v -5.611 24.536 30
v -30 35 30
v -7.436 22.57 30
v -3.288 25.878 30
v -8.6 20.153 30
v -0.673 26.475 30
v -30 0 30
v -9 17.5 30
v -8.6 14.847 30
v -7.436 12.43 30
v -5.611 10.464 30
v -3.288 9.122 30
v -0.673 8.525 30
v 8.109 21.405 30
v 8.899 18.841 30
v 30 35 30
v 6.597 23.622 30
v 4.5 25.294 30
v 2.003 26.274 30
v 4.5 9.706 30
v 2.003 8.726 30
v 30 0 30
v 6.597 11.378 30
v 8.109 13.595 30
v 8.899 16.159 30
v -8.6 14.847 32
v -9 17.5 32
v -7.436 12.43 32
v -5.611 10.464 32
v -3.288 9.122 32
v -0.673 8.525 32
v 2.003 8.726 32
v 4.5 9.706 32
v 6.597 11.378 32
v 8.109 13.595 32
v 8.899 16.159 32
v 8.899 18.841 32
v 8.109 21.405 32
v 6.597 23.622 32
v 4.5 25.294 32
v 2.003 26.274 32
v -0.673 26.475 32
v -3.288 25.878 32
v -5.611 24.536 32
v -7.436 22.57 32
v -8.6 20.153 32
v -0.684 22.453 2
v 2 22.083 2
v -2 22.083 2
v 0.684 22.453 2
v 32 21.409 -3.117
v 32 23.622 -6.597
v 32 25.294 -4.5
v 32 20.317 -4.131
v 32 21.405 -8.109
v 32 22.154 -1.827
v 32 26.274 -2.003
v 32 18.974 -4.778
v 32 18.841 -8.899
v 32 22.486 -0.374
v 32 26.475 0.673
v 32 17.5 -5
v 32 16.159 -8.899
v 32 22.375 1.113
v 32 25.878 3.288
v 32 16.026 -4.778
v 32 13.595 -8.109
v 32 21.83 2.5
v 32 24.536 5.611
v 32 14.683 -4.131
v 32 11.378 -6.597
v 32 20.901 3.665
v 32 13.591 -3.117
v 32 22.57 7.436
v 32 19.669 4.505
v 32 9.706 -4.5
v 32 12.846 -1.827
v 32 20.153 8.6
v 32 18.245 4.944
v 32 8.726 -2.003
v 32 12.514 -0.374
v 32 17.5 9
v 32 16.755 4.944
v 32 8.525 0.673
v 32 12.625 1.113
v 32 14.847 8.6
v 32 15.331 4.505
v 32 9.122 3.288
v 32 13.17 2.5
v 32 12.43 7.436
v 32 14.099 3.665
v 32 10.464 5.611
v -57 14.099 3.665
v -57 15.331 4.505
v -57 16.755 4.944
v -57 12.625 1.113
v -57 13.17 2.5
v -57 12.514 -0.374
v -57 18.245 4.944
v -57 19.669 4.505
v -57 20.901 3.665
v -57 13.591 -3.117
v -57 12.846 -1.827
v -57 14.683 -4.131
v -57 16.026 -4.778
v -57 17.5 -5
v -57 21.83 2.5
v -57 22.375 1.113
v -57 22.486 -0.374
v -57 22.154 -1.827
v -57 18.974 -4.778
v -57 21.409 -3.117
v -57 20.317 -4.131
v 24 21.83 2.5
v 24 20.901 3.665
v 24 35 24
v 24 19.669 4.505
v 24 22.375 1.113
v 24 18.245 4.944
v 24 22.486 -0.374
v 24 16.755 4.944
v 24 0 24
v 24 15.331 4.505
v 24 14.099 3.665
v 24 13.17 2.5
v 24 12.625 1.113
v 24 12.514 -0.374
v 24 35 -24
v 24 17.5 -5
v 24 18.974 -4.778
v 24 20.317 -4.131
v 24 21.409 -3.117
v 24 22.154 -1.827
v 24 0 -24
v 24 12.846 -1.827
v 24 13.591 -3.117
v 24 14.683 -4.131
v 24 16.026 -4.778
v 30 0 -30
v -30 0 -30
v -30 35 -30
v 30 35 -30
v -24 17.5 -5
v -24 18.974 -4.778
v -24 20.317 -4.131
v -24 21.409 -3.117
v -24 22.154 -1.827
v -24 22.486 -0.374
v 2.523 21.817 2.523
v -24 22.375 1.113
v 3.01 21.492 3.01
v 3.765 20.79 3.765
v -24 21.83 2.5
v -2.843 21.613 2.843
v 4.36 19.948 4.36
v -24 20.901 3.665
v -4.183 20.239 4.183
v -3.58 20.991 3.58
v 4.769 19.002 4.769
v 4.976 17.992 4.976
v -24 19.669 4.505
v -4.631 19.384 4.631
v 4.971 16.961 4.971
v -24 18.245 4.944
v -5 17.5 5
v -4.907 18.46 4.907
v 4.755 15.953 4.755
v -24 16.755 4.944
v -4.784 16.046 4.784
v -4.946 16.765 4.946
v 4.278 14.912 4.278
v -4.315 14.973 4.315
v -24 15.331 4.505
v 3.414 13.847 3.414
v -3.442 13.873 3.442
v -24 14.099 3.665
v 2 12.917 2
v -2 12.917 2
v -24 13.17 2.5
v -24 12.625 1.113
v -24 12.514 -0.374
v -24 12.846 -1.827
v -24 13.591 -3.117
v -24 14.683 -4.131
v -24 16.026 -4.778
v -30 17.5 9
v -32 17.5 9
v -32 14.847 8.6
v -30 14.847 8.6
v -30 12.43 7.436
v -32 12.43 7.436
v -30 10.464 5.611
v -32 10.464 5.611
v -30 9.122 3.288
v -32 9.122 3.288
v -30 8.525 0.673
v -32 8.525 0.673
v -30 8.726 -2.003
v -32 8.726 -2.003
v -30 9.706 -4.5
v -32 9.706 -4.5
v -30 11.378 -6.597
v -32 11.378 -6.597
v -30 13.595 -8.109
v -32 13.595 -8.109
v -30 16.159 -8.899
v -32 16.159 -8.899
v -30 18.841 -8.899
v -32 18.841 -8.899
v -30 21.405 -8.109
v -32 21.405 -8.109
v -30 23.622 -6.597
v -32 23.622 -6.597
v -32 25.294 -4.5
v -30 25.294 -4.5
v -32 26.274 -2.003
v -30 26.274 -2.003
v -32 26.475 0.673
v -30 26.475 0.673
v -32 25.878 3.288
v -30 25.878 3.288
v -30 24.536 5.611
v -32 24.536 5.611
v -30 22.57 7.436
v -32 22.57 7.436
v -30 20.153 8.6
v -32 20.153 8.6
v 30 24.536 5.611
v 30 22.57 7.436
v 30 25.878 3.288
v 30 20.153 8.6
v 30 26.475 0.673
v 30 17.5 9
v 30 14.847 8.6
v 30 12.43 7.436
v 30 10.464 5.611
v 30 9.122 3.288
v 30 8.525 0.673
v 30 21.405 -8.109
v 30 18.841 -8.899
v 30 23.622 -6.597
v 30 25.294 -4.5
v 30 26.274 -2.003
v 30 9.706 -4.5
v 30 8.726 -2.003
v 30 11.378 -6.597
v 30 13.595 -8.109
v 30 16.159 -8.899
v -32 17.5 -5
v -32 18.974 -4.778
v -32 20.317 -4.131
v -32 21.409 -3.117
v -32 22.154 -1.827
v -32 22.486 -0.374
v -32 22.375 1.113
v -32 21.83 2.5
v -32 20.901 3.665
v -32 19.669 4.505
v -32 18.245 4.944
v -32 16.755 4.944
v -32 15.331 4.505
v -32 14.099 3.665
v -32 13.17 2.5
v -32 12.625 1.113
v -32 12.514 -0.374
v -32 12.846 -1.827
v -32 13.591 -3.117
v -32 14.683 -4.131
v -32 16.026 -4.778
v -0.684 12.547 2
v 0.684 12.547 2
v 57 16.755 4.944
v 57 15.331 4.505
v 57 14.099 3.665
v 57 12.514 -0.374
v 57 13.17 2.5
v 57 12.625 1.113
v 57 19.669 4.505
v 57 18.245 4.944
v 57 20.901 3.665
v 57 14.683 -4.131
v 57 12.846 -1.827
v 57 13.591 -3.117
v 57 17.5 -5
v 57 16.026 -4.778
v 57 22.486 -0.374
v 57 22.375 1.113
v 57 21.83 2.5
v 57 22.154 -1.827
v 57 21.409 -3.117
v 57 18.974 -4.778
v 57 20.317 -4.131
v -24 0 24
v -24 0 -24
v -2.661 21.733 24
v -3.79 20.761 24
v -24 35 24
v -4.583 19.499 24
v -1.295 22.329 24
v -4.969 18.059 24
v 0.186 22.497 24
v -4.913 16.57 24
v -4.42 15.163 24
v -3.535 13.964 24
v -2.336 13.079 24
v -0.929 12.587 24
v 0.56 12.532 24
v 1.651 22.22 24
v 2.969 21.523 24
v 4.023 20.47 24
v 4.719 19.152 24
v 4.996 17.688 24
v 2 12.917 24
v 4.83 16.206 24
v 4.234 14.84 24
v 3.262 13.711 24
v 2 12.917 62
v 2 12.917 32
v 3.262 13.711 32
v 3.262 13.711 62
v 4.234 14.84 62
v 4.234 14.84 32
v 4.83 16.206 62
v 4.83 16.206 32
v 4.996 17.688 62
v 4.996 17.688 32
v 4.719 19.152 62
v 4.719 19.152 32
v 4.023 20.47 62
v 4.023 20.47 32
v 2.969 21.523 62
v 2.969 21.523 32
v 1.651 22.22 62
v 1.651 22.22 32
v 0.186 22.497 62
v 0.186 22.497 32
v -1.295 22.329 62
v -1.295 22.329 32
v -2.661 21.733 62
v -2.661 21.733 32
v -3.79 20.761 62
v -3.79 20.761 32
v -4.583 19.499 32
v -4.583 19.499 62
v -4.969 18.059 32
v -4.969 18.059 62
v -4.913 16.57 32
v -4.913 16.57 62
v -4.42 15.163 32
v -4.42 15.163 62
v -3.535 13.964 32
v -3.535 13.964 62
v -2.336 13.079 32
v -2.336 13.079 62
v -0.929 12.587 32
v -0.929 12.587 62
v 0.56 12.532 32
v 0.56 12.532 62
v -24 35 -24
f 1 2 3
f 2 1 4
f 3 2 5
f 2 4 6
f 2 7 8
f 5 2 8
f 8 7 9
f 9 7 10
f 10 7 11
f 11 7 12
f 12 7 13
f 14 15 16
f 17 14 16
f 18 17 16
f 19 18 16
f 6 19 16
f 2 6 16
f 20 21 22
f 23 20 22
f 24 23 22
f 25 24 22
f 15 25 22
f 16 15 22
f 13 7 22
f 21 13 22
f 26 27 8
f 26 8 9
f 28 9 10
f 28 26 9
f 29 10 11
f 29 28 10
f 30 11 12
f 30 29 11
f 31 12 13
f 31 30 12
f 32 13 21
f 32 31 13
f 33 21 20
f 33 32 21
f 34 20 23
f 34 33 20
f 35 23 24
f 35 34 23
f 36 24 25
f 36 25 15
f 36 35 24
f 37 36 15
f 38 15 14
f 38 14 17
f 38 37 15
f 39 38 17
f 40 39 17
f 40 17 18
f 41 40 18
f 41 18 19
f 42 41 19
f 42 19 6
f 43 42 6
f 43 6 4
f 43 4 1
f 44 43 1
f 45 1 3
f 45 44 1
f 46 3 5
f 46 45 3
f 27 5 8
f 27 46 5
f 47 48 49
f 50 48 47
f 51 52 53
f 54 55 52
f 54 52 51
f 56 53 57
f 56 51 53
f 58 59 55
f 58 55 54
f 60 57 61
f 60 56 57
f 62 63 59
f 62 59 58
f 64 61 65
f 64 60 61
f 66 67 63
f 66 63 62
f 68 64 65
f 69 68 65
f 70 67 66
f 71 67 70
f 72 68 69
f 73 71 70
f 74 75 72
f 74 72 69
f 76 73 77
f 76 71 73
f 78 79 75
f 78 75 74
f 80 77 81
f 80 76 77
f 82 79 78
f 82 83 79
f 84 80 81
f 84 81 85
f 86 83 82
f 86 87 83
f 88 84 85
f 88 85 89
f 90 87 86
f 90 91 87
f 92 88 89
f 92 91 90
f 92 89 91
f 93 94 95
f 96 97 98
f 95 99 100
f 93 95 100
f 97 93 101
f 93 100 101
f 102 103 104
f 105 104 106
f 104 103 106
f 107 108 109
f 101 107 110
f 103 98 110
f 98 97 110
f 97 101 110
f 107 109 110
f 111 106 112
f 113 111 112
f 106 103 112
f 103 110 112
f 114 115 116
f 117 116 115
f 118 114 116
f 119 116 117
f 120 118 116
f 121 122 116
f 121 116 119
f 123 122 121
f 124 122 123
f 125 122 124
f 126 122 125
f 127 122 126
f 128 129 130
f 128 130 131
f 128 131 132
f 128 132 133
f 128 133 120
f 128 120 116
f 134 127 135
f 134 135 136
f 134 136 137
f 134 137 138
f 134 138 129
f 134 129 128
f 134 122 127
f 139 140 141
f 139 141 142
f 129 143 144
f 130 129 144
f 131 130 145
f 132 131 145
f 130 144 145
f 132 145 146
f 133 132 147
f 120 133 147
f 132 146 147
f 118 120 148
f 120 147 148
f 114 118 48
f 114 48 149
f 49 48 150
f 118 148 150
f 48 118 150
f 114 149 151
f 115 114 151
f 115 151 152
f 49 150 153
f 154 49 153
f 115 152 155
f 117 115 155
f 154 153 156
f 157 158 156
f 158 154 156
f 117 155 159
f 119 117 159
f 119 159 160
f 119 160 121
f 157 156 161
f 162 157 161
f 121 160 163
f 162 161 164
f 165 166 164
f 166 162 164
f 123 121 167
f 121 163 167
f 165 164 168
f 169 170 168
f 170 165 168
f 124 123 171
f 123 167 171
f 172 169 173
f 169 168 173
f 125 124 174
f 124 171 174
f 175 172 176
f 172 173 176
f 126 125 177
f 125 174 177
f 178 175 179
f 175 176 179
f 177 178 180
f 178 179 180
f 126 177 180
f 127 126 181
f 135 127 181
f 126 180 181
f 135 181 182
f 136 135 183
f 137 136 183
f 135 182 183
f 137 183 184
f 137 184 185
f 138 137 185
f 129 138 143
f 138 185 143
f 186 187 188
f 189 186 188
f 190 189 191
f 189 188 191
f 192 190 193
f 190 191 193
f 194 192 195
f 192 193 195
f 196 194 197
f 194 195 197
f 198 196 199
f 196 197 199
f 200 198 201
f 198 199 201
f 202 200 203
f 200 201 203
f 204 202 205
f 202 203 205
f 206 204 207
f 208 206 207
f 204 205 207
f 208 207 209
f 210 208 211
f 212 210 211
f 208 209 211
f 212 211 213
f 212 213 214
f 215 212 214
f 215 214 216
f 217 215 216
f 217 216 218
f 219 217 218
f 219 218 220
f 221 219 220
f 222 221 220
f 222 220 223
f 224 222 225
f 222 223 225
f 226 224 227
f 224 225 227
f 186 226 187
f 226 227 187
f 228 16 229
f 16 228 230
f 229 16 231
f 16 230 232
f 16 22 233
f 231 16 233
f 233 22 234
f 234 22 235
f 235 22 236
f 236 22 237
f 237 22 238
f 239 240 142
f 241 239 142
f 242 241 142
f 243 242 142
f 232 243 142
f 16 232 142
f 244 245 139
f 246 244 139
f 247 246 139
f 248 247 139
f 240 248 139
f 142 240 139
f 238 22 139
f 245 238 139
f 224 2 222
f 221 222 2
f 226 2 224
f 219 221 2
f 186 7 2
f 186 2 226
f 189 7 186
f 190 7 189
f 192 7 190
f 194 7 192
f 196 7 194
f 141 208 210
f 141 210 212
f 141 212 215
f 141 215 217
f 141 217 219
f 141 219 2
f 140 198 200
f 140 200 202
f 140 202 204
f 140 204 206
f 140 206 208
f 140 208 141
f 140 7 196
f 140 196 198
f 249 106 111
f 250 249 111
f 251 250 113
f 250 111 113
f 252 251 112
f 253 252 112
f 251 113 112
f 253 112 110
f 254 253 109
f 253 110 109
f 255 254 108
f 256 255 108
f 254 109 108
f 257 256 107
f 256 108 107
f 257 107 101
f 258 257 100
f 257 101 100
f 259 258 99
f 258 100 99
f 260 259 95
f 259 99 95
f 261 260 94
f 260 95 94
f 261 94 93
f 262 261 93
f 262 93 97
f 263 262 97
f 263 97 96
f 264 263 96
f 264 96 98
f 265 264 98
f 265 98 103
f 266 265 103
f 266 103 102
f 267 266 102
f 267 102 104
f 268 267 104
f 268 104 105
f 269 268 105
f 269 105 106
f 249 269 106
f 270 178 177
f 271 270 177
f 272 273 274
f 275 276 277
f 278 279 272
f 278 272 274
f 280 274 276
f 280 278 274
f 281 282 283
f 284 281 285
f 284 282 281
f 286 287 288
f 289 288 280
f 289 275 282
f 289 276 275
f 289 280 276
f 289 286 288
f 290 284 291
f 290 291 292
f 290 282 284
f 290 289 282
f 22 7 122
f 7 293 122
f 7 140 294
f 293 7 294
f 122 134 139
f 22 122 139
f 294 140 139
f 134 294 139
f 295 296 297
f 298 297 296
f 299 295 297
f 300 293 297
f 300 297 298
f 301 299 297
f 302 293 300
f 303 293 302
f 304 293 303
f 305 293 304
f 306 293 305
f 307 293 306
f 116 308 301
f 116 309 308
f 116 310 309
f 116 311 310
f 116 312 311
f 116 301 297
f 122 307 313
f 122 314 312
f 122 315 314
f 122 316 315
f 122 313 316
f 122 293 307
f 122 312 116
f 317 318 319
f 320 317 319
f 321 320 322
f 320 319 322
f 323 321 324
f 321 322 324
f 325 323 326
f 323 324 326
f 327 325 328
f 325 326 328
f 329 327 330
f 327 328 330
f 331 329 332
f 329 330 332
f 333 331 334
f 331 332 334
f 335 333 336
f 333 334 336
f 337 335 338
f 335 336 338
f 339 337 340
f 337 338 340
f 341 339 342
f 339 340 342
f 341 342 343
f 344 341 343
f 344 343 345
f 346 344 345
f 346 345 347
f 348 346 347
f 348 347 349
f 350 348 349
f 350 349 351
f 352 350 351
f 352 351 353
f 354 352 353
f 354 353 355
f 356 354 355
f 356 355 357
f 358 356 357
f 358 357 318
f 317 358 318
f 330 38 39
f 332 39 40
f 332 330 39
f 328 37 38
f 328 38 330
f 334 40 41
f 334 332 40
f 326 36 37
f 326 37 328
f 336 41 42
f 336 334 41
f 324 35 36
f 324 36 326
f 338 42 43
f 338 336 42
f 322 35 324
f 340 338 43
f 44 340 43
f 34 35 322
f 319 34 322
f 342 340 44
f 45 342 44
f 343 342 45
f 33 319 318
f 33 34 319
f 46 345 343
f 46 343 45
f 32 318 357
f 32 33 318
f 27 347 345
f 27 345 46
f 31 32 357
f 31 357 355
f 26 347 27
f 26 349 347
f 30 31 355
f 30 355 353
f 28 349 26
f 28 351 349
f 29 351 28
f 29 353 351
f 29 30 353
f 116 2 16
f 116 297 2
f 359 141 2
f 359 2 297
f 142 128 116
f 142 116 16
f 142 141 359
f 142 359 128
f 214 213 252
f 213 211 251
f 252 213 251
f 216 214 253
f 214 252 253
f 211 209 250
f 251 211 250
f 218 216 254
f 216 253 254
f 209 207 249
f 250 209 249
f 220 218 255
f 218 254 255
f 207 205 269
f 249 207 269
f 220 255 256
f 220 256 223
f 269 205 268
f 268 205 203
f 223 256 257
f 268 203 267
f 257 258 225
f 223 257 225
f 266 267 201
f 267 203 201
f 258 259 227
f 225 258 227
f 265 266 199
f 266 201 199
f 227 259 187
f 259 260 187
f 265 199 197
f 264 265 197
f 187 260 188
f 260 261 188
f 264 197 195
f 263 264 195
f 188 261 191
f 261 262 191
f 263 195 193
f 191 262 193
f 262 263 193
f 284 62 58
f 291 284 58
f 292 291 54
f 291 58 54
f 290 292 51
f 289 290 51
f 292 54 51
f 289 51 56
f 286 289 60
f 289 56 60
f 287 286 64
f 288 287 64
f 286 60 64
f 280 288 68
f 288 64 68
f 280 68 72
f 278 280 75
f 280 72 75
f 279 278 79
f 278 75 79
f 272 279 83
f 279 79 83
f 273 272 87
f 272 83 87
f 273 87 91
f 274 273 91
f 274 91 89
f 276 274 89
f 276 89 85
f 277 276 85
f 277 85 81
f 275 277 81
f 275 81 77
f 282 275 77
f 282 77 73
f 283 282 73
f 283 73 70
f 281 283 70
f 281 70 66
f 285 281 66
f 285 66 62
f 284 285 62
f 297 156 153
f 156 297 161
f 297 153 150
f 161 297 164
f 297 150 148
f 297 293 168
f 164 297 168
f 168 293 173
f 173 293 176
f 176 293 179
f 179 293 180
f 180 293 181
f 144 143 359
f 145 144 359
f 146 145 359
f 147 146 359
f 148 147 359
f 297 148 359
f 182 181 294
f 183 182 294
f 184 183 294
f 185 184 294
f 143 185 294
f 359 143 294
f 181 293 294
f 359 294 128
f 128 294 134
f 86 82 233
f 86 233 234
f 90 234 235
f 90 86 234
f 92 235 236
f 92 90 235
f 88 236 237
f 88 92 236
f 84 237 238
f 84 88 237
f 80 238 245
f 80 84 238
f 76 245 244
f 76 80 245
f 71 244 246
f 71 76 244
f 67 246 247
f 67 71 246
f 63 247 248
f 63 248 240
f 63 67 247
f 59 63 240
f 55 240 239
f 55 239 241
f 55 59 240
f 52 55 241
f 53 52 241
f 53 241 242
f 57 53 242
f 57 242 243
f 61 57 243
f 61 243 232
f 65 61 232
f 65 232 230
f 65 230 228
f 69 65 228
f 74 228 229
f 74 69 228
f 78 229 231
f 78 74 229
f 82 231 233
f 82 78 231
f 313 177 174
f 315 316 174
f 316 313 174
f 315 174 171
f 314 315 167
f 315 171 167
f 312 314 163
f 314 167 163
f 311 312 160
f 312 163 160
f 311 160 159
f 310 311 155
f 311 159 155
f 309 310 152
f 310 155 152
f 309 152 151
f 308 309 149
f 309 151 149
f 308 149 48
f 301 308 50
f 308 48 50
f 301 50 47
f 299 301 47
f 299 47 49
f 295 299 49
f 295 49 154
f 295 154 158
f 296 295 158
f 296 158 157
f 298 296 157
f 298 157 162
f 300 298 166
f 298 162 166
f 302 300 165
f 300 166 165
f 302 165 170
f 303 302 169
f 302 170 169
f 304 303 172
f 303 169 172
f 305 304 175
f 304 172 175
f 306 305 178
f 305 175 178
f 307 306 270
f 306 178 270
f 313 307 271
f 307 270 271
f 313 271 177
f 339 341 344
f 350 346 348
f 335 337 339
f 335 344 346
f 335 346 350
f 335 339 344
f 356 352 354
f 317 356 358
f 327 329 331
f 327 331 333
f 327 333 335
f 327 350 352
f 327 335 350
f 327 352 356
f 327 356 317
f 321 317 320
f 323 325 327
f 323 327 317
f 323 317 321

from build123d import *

# Parameters (mm, degrees)
SKETCH2_W                = 60
SKETCH2_H                = 60
SKETCH2_W_2              = 48
SKETCH2_H_2              = 48
BOSS_EXTRUDE1_DEPTH      = 35
SKETCH3_R                = 5
CUT_EXTRUDE1_DEPTH       = 76.663729752
CUT_EXTRUDE2_REACH       = 77.664
SKETCH4_R                = 5
BOSS_EXTRUDE2_START      = 2
SKETCH5_R                = 9
SKETCH5_R_2              = 5
BOSS_EXTRUDE2_DEPTH      = 2
BOSS_EXTRUDE3_START      = 2
SKETCH7_R                = 9
SKETCH7_R_2              = 5
BOSS_EXTRUDE3_DEPTH      = 2
BOSS_EXTRUDE4_DEPTH      = 57
BOSS_EXTRUDE4_DEPTH_BACK = 57
SKETCH8_R                = 5
BOSS_EXTRUDE5_DEPTH      = 30
BOSS_EXTRUDE5_DEPTH_BACK = 30
SKETCH9_R                = 5


with BuildPart() as part:
    # Sketch2 → Boss-Extrude1 (new body)
    with BuildSketch(Plane(origin=(0, 0, 0), x_dir=(1, 0, 0), z_dir=(0, 1, 0))):
        Rectangle(SKETCH2_W, SKETCH2_H)
        Rectangle(SKETCH2_W_2, SKETCH2_H_2, mode=Mode.SUBTRACT)
    extrude(amount=BOSS_EXTRUDE1_DEPTH)

    # Sketch3 → Cut-Extrude1 (cut, through all)
    with BuildSketch(Plane(origin=(30, 0, 0), x_dir=(0, 0, -1), z_dir=(1, 0, 0))):
        with Locations((0, 17.5)):
            Circle(SKETCH3_R)
    extrude(amount=-CUT_EXTRUDE1_DEPTH, mode=Mode.SUBTRACT)

    # Sketch4 → Cut-Extrude2 (cut, up to next)
    with BuildSketch(Plane.XY.offset(30), mode=Mode.PRIVATE) as cut_extrude2_sk1:
        with Locations((0, 17.5)):
            Circle(SKETCH4_R)
    cut_extrude2_tool1 = extrude(cut_extrude2_sk1.sketch, amount=-CUT_EXTRUDE2_REACH, mode=Mode.PRIVATE) & part.part
    add(cut_extrude2_tool1.solids().sort_by_distance((0, 17.5, 30))[0], mode=Mode.SUBTRACT)

    # Sketch5 → Boss-Extrude2 (add)
    with BuildSketch(Plane.XY.offset(30).offset(BOSS_EXTRUDE2_START)):
        with Locations(Location((0, 17.5, 0), (0, 0, 180))):
            Circle(SKETCH5_R)
        with Locations((0, 17.5)):
            Circle(SKETCH5_R_2, mode=Mode.SUBTRACT)
    extrude(amount=-BOSS_EXTRUDE2_DEPTH)

    # Sketch7 → Boss-Extrude3 (add)
    with BuildSketch(Plane(origin=(30, 0, 0), x_dir=(0, 0, -1), z_dir=(1, 0, 0)).offset(BOSS_EXTRUDE3_START)):
        with Locations(Location((0, 17.5, 0), (0, 0, 180))):
            Circle(SKETCH7_R)
        with Locations((0, 17.5)):
            Circle(SKETCH7_R_2, mode=Mode.SUBTRACT)
    boss_extrude3 = extrude(amount=-BOSS_EXTRUDE3_DEPTH)

    # Mirror1: Boss-Extrude3 across plane
    add(boss_extrude3.mirror(Plane(origin=(0, 0, 0), x_dir=(0, 0, 1), z_dir=(1, 0, 0))))

    # Sketch8 → Boss-Extrude4 (add, two sides: drawn at the far end of the back side and taken through both)
    with BuildSketch(Plane(origin=(0, 0, 0), x_dir=(0, 0, -1), z_dir=(1, 0, 0)).offset(-BOSS_EXTRUDE4_DEPTH_BACK)):
        with Locations((0, 17.5)):
            Circle(SKETCH8_R)
    extrude(amount=BOSS_EXTRUDE4_DEPTH + BOSS_EXTRUDE4_DEPTH_BACK)

    # Sketch9 → Boss-Extrude5 (add, two sides: drawn at the far end of the back side and taken through both)
    with BuildSketch(Plane.XY.offset(32).offset(-BOSS_EXTRUDE5_DEPTH_BACK)):
        with Locations(Location((0, 17.5, 0), (0, 0, 293.578178478))):
            Circle(SKETCH9_R)
    extrude(amount=BOSS_EXTRUDE5_DEPTH + BOSS_EXTRUDE5_DEPTH_BACK)


solid = part.part
